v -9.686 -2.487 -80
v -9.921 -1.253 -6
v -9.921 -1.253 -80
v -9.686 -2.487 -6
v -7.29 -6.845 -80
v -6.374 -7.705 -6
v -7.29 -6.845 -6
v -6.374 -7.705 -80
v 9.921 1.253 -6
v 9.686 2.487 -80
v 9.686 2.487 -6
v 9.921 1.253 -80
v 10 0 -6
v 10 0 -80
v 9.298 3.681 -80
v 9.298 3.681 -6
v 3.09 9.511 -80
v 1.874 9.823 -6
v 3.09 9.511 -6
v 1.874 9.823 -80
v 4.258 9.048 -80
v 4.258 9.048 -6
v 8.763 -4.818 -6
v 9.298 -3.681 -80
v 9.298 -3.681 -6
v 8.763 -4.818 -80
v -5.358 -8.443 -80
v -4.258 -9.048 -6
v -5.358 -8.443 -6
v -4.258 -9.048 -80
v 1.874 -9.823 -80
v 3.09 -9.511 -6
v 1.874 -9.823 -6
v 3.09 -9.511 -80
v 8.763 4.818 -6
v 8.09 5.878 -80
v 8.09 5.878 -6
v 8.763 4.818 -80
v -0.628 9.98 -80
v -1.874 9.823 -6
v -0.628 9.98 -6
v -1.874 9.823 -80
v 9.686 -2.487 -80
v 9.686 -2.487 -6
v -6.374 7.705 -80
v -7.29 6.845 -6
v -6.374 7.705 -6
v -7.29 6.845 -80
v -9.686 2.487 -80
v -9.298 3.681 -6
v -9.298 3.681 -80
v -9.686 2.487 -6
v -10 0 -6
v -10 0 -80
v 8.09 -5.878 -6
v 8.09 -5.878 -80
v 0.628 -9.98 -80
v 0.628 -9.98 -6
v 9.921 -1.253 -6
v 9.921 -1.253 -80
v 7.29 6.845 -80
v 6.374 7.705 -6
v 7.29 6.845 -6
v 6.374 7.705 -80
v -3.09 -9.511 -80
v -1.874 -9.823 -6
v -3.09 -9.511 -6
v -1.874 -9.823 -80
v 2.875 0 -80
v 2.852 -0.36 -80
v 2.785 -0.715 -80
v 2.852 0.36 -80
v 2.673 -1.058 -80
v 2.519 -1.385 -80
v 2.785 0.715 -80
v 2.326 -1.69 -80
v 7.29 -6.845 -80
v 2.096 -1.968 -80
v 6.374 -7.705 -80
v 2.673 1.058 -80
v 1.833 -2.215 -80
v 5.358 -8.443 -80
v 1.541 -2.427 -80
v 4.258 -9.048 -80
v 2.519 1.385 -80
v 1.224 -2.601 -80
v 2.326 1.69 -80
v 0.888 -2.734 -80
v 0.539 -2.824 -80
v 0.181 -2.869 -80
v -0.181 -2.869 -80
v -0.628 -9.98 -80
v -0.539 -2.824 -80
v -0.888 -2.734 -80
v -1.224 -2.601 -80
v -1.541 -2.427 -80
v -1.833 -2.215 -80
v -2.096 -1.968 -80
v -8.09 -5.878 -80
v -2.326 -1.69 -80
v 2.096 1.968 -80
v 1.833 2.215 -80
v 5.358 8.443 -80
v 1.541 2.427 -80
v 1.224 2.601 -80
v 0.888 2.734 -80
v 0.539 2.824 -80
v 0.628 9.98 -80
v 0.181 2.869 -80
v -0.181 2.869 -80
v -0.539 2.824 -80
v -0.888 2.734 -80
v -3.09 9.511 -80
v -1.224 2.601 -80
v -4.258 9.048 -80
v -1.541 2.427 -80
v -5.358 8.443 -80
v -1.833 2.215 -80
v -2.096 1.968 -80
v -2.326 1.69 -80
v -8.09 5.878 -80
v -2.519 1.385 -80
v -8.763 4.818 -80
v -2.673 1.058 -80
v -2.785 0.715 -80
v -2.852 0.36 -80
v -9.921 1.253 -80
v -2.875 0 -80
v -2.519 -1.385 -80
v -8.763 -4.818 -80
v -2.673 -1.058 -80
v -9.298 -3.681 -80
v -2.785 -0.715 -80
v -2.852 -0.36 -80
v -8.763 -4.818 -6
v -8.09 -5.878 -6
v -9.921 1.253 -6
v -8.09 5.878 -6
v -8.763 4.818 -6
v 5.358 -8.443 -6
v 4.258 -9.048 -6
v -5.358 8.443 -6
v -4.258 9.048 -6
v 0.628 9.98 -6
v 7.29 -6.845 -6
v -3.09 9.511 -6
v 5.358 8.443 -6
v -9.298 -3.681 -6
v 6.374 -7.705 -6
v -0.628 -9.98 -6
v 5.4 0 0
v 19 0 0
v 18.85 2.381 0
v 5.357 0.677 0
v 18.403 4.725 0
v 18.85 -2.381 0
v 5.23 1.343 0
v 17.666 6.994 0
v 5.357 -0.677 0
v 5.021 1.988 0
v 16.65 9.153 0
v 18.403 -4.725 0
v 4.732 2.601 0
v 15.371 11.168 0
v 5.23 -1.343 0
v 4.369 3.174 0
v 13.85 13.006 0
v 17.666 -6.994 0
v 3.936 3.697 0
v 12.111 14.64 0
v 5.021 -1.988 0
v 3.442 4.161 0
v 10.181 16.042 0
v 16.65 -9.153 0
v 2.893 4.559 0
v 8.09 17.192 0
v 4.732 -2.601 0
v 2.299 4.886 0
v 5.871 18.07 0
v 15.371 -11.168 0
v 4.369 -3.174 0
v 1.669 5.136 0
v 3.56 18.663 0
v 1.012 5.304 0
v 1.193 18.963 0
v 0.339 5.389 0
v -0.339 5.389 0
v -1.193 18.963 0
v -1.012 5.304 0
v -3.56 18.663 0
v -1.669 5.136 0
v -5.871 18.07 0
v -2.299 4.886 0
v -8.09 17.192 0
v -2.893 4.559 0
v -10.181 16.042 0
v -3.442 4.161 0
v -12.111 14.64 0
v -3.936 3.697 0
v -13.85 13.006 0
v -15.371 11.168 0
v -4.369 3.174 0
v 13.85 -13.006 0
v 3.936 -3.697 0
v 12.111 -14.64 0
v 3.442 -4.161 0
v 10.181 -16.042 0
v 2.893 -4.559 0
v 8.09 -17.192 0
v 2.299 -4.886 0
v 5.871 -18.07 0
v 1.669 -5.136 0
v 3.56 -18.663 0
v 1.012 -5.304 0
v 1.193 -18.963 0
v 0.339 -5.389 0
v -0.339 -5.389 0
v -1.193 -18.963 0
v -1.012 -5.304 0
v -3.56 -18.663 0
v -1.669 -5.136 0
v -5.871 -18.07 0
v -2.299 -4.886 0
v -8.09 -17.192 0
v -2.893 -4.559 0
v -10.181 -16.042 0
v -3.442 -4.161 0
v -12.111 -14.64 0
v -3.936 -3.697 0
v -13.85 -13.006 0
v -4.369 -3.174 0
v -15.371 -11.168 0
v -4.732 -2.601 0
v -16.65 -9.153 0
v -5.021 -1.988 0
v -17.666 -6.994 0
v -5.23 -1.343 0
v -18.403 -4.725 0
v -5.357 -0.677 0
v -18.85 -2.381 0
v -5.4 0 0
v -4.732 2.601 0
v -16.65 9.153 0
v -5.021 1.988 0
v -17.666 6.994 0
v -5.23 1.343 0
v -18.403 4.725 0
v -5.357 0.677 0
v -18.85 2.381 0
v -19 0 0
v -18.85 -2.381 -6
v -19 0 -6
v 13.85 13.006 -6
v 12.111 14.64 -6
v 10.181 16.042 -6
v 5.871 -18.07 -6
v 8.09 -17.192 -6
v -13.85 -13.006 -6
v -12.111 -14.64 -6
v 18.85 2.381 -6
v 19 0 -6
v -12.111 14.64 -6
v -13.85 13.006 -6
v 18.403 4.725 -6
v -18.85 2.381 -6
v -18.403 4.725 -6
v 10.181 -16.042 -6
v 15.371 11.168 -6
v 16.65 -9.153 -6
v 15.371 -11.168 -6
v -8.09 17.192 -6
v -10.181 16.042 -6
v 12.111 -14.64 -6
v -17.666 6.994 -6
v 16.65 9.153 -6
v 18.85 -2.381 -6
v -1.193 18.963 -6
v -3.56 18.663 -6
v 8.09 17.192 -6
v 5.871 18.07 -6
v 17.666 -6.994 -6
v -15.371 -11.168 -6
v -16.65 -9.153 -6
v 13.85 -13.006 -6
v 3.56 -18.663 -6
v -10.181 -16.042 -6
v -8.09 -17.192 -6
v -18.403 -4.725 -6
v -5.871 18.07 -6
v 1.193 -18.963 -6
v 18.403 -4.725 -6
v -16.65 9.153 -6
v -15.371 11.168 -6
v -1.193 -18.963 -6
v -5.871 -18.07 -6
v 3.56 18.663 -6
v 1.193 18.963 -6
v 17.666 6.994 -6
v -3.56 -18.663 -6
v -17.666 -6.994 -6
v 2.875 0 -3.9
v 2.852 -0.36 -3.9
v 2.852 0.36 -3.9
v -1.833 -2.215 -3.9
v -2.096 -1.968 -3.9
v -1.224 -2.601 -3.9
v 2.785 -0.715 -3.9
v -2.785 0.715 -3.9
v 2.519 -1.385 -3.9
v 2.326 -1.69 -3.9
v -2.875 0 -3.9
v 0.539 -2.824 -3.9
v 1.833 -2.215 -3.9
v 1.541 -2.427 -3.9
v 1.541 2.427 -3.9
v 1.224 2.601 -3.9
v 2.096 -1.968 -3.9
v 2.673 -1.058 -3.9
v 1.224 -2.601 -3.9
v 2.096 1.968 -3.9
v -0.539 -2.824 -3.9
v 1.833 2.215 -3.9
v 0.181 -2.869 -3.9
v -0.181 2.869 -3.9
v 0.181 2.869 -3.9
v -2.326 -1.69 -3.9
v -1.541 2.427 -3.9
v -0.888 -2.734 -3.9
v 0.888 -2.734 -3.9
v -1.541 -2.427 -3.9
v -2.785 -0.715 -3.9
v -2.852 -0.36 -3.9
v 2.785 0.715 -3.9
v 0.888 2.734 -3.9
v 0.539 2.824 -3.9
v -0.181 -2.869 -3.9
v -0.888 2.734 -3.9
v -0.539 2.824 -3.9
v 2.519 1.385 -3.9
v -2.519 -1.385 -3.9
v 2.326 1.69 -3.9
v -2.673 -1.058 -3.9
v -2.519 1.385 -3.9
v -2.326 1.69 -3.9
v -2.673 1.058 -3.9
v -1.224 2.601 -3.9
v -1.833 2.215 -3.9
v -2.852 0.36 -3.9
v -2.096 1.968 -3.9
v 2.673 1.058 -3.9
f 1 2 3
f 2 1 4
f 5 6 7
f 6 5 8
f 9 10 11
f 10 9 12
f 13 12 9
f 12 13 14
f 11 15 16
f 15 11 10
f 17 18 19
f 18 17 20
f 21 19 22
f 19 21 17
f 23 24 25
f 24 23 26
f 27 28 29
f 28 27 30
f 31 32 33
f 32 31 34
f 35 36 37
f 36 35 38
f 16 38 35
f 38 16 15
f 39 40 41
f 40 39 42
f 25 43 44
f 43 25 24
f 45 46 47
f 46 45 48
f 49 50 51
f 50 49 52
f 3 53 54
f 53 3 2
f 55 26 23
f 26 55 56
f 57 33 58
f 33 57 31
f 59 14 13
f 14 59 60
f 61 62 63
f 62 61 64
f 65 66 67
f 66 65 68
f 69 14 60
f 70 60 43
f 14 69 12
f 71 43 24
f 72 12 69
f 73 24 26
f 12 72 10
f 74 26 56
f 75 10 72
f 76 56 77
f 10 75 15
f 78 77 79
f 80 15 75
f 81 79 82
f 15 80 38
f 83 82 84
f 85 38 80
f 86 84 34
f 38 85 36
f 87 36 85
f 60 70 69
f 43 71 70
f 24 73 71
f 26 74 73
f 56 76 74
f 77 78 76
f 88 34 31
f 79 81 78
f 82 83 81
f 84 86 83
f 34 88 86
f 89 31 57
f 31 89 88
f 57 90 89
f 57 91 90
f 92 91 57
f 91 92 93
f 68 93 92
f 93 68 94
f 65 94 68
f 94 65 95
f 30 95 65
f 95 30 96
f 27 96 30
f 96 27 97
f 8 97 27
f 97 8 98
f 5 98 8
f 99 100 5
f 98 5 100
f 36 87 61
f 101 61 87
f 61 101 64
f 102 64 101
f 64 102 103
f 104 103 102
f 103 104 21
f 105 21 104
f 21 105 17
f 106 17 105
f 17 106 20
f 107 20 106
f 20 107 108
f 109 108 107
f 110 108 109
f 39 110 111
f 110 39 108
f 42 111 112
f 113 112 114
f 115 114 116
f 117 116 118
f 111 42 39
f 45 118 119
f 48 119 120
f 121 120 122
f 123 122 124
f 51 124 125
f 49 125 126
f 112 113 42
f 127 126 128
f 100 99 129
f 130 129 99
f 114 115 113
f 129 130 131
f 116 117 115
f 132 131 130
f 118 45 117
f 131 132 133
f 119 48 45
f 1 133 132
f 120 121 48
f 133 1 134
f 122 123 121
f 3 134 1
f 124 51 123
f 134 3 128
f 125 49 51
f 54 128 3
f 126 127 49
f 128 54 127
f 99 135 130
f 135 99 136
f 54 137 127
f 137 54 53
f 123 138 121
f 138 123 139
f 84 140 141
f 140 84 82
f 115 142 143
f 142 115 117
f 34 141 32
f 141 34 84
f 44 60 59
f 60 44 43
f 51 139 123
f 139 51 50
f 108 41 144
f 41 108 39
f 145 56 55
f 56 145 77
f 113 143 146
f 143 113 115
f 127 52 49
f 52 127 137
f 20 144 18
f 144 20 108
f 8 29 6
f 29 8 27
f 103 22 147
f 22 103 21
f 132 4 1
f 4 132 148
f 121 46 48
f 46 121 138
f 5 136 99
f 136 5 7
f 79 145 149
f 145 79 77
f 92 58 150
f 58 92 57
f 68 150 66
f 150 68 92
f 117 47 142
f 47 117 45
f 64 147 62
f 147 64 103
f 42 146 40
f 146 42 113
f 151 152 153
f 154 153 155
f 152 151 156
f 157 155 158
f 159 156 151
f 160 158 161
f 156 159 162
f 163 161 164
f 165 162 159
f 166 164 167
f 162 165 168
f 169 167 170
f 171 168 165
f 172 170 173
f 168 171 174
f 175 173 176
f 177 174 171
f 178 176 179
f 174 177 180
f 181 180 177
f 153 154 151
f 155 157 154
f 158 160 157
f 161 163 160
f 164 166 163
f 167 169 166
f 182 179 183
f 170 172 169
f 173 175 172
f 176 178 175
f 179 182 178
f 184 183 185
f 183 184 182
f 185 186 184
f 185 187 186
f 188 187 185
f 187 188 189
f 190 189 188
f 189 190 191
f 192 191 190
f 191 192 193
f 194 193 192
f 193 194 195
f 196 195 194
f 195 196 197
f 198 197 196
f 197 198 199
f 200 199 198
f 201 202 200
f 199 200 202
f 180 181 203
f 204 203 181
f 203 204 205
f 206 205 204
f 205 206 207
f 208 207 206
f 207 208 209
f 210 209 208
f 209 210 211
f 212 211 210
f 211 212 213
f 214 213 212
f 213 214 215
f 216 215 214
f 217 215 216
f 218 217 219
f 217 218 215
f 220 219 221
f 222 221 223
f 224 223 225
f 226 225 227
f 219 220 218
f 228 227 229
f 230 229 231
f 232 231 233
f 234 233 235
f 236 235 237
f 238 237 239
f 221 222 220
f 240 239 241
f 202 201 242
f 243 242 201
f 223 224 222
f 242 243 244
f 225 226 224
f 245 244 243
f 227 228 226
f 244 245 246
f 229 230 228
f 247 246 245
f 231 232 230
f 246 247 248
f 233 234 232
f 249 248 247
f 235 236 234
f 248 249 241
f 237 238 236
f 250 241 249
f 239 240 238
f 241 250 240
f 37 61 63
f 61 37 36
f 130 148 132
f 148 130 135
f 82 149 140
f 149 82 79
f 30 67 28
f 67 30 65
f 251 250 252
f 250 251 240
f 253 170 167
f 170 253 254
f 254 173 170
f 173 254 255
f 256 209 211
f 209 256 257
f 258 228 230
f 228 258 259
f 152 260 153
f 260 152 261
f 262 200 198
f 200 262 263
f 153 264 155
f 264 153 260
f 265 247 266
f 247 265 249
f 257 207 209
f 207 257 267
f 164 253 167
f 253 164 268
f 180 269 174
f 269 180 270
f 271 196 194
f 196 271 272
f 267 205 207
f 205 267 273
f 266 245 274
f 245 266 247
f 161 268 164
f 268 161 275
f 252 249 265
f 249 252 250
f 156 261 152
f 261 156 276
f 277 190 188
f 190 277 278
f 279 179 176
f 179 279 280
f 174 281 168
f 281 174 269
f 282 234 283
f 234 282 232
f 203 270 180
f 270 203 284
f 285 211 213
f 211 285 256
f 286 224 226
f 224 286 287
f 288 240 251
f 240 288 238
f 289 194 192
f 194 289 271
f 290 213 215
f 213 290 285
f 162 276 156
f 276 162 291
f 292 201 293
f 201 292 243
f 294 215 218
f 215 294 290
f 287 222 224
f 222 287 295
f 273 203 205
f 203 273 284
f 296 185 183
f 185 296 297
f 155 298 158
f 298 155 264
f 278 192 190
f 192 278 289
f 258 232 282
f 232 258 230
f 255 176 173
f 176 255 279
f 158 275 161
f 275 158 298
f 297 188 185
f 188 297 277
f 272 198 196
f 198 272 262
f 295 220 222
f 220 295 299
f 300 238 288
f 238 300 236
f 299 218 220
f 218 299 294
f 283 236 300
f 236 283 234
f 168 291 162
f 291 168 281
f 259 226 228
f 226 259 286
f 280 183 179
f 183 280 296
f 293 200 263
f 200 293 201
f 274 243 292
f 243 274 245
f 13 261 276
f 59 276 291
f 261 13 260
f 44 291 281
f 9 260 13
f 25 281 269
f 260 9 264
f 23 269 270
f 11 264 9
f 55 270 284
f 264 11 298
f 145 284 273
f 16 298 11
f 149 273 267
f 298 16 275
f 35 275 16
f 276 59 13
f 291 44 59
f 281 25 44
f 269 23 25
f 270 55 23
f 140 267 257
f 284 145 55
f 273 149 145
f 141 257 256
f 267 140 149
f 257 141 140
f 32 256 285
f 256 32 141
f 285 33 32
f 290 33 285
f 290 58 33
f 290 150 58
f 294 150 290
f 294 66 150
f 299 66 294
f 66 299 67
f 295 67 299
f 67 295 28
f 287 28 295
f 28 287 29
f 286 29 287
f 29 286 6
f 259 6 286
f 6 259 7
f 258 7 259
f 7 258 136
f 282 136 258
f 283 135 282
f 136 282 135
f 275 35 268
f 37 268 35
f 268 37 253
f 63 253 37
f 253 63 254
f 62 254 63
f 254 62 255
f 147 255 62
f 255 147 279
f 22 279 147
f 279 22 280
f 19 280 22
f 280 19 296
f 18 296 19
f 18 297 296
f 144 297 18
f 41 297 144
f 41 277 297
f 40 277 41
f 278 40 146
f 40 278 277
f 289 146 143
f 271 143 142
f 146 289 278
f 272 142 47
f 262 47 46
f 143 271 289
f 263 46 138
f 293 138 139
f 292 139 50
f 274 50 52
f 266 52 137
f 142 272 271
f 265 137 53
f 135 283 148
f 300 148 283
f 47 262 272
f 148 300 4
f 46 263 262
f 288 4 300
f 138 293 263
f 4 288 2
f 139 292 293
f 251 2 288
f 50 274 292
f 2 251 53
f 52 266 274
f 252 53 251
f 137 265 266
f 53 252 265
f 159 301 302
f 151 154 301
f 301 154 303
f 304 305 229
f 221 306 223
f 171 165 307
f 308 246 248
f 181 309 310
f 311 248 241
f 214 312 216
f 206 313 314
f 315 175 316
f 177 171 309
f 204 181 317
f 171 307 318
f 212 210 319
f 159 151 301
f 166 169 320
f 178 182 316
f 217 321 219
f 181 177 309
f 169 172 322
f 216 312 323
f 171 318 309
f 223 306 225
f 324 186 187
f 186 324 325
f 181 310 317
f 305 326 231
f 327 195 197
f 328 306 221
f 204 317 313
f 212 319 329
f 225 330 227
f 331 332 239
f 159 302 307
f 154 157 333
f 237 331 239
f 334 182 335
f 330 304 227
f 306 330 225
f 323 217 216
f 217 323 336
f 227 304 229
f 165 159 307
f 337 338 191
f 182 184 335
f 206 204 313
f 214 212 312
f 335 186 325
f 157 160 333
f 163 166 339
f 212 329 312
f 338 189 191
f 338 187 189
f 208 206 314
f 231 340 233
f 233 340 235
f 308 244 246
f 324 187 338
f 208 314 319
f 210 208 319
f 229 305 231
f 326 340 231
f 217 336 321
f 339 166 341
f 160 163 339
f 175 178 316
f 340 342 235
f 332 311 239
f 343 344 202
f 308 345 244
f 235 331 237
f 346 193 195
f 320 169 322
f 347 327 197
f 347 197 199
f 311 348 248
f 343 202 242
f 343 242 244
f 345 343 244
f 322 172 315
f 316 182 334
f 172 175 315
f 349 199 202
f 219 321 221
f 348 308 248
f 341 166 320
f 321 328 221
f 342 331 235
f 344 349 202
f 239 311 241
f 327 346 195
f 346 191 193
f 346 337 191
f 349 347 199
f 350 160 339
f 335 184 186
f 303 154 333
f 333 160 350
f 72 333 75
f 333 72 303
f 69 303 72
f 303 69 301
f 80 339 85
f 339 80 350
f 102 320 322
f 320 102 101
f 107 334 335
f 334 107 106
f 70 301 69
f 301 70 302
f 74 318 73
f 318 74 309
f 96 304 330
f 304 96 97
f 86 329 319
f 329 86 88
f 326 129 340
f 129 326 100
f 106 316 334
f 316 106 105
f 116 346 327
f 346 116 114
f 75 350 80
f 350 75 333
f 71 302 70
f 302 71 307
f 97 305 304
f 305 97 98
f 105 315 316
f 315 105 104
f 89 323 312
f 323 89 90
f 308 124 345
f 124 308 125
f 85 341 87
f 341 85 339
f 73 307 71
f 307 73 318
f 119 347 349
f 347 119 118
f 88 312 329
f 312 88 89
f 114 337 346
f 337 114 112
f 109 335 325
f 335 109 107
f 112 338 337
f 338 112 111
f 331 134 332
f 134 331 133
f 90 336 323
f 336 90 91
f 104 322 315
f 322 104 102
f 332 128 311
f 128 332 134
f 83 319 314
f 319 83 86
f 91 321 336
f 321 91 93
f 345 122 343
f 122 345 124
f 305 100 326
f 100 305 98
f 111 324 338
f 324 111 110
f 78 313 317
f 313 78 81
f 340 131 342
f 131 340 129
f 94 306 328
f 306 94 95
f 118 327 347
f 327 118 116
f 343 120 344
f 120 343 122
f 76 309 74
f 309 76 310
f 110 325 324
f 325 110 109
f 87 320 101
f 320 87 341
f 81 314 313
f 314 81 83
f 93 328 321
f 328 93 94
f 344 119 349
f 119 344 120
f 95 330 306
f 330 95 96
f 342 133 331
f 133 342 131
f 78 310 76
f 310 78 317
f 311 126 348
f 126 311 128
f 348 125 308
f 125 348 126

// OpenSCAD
$fn = 50;


difference() {
	union() {
		translate(v = [0, 0, -80.0000000000]) {
			cylinder(h = 80, r = 10.0000000000);
		}
		translate(v = [0, 0, -6.0000000000]) {
			cylinder(h = 6, r = 19.0000000000);
		}
	}
	union() {
		translate(v = [0, 0, 0]) {
			rotate(a = [0, 0, 0]) {
				difference() {
					union() {
						#translate(v = [0, 0, -80.0000000000]) {
							cylinder(h = 80, r = 2.6000000000);
						}
						#translate(v = [0, 0, -3.9000000000]) {
							cylinder(h = 3.9000000000, r1 = 2.8750000000, r2 = 5.4000000000);
						}
						#translate(v = [0, 0, -80.0000000000]) {
							cylinder(h = 80, r = 2.8750000000);
						}
						#translate(v = [0, 0, -80.0000000000]) {
							cylinder(h = 80, r = 2.6000000000);
						}
					}
					union();
				}
			}
		}
	}
}
